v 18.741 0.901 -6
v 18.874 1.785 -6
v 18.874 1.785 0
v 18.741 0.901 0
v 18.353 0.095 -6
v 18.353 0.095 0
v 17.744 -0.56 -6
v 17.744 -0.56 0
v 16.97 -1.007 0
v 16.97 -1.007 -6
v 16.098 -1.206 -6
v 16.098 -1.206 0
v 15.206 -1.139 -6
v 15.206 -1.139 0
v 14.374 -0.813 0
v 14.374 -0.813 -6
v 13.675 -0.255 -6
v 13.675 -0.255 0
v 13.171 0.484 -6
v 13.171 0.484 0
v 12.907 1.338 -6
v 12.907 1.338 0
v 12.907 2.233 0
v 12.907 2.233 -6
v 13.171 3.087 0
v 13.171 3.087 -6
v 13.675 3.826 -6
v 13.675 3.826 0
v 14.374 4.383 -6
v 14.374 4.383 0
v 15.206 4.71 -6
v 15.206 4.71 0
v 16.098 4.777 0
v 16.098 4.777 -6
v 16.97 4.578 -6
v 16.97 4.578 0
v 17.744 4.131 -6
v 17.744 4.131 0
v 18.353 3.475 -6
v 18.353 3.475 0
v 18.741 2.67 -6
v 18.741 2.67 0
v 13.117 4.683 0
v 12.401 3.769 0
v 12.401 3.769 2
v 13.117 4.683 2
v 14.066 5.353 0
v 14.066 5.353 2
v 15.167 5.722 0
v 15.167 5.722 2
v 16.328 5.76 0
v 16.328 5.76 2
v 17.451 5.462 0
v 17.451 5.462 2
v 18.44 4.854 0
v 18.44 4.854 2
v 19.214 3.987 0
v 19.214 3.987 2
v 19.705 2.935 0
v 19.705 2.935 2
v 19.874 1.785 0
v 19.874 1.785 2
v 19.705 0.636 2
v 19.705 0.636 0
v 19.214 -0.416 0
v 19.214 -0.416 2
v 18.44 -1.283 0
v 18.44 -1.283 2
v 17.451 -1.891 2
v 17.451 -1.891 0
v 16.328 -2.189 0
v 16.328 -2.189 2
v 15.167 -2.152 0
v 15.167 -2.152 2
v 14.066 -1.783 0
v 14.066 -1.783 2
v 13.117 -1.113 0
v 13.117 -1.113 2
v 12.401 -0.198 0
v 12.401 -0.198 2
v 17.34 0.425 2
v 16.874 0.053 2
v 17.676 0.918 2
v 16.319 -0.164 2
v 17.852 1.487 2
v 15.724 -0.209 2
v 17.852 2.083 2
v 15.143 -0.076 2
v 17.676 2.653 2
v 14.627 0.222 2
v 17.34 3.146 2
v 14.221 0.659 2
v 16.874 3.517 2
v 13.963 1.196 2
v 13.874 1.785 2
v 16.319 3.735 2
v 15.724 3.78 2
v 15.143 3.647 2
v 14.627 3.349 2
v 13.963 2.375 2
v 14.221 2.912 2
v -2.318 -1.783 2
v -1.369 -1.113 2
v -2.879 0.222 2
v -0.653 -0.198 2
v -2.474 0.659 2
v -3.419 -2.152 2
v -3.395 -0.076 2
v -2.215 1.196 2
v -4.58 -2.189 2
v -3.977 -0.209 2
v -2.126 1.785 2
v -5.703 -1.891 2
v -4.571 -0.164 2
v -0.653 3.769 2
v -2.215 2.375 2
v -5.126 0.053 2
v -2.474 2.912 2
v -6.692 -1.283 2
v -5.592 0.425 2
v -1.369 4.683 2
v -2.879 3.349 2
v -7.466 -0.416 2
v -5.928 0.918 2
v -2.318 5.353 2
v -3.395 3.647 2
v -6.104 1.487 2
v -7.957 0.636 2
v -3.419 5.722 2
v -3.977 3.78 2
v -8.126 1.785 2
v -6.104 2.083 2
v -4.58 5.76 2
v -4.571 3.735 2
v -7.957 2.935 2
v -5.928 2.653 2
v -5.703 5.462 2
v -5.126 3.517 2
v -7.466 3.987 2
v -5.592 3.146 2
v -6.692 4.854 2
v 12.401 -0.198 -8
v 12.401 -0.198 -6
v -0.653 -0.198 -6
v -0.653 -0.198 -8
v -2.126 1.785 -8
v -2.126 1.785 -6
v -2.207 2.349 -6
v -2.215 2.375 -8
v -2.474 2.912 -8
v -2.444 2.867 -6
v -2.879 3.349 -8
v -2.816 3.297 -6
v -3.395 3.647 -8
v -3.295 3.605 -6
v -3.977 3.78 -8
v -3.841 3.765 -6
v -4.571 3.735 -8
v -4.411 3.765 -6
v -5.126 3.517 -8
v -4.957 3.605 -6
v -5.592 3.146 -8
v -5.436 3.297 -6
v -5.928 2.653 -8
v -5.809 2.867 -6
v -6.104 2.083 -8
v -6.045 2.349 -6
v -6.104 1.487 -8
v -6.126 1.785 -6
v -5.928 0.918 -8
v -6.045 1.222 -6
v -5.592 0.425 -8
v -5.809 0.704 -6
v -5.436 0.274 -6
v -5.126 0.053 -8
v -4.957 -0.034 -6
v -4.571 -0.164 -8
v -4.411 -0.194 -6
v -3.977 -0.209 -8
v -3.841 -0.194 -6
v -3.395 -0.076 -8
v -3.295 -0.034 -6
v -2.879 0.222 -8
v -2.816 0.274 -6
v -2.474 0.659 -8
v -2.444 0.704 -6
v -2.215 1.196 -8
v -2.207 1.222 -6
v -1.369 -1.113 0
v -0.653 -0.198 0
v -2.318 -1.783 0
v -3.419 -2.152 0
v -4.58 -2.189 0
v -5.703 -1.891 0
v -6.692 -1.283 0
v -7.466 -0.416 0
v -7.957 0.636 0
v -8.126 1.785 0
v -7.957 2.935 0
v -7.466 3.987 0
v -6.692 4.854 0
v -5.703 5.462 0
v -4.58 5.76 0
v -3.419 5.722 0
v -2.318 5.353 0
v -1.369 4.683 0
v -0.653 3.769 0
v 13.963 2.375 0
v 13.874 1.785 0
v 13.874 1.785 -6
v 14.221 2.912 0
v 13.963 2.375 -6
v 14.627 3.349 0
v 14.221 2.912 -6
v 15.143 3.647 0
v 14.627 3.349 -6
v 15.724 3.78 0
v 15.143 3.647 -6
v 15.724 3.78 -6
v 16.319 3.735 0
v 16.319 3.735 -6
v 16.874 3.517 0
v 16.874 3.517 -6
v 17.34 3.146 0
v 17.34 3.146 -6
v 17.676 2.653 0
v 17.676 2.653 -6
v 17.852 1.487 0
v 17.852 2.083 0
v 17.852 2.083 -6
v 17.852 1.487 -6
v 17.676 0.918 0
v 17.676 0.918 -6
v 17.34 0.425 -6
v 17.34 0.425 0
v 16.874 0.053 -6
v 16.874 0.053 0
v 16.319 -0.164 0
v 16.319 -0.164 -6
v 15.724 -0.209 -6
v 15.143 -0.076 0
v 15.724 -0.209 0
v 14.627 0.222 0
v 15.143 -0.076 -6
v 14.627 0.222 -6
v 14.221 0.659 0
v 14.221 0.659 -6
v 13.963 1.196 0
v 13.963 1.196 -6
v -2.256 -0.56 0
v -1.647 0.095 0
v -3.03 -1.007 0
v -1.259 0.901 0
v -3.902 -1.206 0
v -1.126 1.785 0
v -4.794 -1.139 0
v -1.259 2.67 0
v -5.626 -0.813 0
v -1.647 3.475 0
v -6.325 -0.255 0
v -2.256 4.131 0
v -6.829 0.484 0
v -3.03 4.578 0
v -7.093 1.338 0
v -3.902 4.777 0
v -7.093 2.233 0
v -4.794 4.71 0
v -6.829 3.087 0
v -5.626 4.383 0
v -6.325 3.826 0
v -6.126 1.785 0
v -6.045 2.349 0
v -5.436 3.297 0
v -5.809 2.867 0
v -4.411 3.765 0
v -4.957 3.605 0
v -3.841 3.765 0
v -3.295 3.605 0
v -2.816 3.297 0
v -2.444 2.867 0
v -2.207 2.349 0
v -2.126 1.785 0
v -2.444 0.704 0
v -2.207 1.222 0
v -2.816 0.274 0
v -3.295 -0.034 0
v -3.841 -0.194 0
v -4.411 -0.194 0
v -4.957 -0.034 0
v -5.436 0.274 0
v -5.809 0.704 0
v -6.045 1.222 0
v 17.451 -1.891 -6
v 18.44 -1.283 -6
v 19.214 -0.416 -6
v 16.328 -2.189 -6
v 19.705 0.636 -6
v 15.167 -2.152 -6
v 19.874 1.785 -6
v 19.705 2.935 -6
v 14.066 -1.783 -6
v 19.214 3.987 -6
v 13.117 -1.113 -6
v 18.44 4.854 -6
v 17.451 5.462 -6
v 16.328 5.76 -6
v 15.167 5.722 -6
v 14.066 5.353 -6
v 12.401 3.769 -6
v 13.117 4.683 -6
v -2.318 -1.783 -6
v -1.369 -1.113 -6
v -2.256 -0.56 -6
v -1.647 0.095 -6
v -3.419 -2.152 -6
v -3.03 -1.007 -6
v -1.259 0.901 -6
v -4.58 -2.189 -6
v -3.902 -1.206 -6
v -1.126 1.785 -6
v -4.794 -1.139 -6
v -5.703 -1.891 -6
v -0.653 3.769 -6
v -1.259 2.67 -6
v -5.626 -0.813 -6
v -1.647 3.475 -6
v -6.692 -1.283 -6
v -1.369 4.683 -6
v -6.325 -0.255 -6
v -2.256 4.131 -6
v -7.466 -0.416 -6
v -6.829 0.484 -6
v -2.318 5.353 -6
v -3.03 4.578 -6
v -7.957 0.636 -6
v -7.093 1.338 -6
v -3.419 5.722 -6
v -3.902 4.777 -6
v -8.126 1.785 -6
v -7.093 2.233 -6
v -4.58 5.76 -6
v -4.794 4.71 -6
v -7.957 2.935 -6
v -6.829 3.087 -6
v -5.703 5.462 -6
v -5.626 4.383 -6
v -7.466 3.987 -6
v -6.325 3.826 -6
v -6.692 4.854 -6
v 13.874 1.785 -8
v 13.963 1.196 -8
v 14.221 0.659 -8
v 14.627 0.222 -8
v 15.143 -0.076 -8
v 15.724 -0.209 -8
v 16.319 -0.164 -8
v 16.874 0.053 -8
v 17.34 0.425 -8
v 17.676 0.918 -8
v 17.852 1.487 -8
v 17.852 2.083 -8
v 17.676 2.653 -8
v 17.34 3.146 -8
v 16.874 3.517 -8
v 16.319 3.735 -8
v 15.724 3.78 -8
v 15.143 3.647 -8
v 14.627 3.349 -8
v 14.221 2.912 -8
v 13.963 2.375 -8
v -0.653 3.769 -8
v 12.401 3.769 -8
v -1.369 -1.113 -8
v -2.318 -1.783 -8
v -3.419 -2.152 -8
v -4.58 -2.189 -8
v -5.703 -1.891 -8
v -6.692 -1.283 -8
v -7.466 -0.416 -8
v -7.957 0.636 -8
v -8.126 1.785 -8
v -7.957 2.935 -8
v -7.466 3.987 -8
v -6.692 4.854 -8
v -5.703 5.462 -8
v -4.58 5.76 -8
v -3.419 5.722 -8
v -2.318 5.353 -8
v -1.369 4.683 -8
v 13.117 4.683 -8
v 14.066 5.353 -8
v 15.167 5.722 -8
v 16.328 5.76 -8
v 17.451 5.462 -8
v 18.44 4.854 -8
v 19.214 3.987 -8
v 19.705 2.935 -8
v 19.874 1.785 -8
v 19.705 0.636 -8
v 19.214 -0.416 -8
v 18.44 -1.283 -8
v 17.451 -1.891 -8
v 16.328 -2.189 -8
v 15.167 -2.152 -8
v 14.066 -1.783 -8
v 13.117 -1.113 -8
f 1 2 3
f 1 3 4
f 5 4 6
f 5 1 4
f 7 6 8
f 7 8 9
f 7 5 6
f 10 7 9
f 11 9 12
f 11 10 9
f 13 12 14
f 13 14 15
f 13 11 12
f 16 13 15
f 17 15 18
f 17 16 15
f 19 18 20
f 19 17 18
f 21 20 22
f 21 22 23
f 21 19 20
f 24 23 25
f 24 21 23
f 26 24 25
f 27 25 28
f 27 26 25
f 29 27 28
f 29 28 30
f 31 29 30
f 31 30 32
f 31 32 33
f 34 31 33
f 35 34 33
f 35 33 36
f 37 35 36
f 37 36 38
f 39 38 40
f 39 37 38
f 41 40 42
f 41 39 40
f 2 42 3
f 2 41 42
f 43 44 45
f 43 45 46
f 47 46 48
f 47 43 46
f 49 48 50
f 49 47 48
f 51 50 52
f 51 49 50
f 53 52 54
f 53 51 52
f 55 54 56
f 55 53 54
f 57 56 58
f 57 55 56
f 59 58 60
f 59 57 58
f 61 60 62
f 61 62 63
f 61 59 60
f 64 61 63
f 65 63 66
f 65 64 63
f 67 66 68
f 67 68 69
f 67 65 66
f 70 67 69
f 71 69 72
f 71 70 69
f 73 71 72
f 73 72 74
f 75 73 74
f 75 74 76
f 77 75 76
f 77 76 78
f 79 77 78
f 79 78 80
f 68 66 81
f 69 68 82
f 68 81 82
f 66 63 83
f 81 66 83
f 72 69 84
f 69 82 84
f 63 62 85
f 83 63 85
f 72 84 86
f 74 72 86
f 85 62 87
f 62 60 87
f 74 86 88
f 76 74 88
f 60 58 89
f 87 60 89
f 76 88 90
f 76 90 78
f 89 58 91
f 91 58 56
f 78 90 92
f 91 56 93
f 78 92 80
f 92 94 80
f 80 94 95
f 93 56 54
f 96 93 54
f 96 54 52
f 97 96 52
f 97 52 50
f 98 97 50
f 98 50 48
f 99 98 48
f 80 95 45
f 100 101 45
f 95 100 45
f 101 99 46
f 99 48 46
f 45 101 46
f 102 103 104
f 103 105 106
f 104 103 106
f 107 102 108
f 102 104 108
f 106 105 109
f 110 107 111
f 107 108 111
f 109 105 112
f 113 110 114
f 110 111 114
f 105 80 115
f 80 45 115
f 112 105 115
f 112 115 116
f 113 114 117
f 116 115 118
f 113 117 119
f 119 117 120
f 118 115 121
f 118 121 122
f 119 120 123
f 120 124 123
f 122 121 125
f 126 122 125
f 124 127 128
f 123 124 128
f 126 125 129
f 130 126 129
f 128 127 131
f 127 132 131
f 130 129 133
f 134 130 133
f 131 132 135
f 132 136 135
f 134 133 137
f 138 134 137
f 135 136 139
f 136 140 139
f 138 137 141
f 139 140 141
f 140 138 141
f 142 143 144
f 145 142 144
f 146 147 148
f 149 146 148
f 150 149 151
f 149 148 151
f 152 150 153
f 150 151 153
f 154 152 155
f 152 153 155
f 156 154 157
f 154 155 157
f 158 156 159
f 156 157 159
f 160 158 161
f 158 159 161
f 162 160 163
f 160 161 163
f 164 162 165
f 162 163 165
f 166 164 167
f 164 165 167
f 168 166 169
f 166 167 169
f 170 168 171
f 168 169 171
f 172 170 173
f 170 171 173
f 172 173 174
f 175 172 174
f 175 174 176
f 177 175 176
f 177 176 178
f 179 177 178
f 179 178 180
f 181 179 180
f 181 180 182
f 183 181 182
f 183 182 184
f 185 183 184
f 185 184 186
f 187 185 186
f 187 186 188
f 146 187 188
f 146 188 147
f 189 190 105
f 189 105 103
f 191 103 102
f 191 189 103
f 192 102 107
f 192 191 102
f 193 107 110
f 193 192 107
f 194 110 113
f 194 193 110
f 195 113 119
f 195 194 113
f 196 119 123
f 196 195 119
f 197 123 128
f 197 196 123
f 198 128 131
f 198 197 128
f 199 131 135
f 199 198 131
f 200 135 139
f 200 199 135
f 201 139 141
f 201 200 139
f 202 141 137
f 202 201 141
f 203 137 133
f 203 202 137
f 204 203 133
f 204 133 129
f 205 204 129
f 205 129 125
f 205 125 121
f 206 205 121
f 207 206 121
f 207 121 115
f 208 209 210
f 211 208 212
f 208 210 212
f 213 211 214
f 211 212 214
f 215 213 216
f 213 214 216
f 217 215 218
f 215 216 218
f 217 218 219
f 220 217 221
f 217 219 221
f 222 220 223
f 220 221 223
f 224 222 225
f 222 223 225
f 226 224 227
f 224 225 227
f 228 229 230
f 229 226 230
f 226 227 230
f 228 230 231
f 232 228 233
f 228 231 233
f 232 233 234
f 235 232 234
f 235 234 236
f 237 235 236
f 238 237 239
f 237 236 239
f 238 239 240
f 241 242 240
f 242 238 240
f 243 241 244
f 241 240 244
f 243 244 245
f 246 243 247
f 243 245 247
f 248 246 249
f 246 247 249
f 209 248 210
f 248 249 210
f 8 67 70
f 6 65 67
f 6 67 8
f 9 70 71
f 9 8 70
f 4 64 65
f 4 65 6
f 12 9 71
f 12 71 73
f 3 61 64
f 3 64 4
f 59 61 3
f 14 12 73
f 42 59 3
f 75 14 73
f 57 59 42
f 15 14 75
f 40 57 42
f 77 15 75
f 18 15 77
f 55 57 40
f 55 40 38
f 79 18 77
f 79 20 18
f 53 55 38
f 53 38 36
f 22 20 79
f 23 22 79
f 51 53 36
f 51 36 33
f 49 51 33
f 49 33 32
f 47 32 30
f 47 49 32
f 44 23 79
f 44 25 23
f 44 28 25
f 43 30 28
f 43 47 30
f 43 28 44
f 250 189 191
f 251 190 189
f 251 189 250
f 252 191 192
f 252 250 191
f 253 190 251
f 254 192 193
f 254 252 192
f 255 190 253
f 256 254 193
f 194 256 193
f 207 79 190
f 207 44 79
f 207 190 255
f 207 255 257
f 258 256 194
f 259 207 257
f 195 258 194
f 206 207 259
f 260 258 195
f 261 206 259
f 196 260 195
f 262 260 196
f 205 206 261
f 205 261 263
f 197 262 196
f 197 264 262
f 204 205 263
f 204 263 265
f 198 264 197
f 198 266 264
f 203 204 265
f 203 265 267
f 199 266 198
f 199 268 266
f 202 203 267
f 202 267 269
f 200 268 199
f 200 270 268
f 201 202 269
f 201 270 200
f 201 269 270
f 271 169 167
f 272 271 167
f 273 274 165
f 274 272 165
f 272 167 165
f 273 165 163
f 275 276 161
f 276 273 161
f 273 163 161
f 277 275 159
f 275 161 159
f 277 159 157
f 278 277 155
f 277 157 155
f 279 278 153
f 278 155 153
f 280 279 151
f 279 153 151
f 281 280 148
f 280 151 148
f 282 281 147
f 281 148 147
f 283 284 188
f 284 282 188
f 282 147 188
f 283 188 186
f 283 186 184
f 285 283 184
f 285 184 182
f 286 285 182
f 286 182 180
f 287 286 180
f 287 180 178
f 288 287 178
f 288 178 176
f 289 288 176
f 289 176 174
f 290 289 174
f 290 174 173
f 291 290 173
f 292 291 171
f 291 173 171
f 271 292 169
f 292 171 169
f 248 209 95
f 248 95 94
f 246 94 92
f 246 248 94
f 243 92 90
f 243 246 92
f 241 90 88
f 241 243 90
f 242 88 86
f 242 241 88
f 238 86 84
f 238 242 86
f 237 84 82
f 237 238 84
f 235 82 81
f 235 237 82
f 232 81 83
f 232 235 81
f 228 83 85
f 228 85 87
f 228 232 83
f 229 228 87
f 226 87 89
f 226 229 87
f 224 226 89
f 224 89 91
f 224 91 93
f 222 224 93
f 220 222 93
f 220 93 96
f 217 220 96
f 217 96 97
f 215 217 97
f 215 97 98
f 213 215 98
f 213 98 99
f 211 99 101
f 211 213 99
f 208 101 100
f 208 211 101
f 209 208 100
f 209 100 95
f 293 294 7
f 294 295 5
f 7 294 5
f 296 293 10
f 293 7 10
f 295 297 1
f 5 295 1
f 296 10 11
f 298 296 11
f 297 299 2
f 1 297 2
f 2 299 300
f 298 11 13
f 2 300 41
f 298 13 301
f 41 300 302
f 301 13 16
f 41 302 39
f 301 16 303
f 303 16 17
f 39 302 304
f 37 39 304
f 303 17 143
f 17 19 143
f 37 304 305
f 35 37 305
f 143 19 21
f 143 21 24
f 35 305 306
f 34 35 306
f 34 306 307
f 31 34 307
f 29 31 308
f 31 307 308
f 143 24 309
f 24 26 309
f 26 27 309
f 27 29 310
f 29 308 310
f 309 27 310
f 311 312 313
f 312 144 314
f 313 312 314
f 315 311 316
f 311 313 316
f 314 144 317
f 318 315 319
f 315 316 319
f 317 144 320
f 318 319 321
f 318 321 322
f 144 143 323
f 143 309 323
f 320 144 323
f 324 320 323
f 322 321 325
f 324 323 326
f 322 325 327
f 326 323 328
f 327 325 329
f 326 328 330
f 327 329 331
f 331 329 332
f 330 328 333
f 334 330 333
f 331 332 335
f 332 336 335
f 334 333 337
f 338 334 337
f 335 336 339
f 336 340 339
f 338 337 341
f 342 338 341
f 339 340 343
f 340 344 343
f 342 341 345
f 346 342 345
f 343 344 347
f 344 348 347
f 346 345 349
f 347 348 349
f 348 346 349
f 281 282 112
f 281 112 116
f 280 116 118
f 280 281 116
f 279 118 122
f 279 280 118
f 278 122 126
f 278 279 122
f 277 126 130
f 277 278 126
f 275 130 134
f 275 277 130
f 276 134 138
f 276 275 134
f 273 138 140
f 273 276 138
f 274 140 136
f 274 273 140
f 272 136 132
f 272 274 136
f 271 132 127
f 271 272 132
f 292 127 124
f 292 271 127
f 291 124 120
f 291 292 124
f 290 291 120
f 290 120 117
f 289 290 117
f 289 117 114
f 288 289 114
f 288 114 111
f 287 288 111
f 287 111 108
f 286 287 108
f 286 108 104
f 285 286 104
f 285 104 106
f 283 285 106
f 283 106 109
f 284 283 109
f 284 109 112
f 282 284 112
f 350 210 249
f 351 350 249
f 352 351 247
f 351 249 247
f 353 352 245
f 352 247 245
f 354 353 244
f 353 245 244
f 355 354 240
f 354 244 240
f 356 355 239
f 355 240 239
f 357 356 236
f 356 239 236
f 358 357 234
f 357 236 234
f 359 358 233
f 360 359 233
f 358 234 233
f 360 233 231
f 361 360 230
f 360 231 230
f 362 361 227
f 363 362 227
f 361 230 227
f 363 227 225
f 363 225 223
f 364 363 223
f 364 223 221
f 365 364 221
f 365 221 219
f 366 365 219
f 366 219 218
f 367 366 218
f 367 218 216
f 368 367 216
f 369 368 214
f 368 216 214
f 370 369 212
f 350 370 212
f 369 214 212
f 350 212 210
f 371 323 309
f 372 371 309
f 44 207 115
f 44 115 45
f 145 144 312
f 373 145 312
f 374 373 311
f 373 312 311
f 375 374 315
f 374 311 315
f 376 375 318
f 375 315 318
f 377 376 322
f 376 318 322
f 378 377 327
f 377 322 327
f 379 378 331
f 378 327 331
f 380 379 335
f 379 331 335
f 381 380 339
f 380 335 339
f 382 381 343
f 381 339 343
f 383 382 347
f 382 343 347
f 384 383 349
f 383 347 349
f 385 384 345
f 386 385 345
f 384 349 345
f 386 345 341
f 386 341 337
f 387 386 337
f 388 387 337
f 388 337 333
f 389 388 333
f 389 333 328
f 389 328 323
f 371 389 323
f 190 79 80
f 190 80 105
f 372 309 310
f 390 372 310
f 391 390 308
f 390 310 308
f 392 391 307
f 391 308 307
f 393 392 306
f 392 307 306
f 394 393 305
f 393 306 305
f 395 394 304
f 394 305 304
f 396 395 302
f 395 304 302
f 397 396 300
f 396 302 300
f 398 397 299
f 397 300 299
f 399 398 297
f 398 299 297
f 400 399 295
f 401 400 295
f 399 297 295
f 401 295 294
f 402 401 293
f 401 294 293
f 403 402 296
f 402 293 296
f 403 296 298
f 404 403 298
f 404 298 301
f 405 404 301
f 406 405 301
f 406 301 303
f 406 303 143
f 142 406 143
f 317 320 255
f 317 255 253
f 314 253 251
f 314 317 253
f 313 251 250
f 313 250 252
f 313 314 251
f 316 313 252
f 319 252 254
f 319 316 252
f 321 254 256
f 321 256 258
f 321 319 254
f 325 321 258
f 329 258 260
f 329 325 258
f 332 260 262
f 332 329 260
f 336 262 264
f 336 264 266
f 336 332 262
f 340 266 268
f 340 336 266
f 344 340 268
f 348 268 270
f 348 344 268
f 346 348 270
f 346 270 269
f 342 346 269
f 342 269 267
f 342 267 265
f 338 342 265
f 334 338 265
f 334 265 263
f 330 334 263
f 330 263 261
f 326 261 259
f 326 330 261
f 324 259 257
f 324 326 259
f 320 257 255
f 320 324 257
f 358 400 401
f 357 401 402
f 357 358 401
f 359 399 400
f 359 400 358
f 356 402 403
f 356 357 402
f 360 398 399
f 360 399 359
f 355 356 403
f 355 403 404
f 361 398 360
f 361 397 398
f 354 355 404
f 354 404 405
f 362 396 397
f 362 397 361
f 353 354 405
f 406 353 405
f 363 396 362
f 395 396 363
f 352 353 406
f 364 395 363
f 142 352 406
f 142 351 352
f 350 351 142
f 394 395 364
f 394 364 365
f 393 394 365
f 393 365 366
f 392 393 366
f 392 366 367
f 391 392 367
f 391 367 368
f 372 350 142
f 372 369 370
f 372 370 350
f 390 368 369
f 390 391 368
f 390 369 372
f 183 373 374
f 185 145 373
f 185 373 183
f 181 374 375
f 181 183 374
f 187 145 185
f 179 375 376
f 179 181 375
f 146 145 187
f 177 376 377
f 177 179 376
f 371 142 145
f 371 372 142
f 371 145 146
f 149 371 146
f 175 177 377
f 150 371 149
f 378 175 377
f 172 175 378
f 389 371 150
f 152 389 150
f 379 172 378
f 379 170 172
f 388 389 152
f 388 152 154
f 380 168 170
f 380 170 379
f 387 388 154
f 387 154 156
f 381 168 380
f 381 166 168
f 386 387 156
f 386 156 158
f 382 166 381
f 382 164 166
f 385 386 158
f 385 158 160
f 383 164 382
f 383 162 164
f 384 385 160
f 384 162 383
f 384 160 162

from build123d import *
from build123d.topology import SkipClean

# Parameters (mm, degrees)
SKETCH_1_R      = 2
EXTRUDE_1_DEPTH = 2
EXTRUDE_START   = 6
SKETCH_2_R      = 3
SKETCH_2_R_2    = 2
EXTRUDE_2_DEPTH = 6


with BuildPart() as part:
    # 草图1 → 凸台-拉伸1 (new body)
    with BuildSketch(Plane.XY):
        with BuildLine():
            Line((-0.652657961, 3.769166536), (12.40050126, 3.769166536))
            ThreePointArc((12.40050126, 3.769166536), (19.873921649, 1.785394675), (12.40050126, -0.198377186))
            Line((12.40050126, -0.198377186), (-0.652657961, -0.198377186))
            ThreePointArc((-0.652657961, -0.198377186), (-8.126078351, 1.785394675), (-0.652657961, 3.769166536))
        make_face()
        with Locations((-4.126078351, 1.785394675)):
            Circle(SKETCH_1_R, mode=Mode.SUBTRACT)
        with Locations(Location((15.873921649, 1.785394675, 0), (0, 0, 180))):
            Circle(SKETCH_1_R, mode=Mode.SUBTRACT)
    extrude_1 = extrude(amount=EXTRUDE_1_DEPTH)

    # 草图2 → 凸台-拉伸2 (add)
    # profile 1 of 2: a face of its own
    with SkipClean():  # the faces are left unmerged after this step: merging them gives an invalid solid
        with BuildSketch(Plane(origin=(0, 0, 0), x_dir=(-1, 0, 0), z_dir=(0, 0, -1)).offset(EXTRUDE_START)):
            with Locations(Location((-15.873921649, 1.785394675, 0), (0, 0, 180))):
                Circle(SKETCH_2_R)
            with Locations((-15.873921649, 1.785394675)):
                Circle(SKETCH_2_R_2, mode=Mode.SUBTRACT)
        # profile 2 of 2: a face of its own
        with BuildSketch(Plane(origin=(0, 0, 0), x_dir=(-1, 0, 0), z_dir=(0, 0, -1)).offset(EXTRUDE_START)):
            with Locations(Location((4.126078351, 1.785394675, 0), (0, 0, 180))):
                Circle(SKETCH_2_R)
            with Locations((4.126078351, 1.785394675)):
                Circle(SKETCH_2_R_2, mode=Mode.SUBTRACT)
        extrude(amount=-EXTRUDE_2_DEPTH)

    # 镜向1: 凸台-拉伸1 across plane
    with SkipClean():  # the faces are left unmerged after this step: merging them gives an invalid solid
        add(extrude_1.mirror(Plane(origin=(0, 0, -3), x_dir=(1, 0, 0), z_dir=(0, 0, -1))))


solid = part.part
